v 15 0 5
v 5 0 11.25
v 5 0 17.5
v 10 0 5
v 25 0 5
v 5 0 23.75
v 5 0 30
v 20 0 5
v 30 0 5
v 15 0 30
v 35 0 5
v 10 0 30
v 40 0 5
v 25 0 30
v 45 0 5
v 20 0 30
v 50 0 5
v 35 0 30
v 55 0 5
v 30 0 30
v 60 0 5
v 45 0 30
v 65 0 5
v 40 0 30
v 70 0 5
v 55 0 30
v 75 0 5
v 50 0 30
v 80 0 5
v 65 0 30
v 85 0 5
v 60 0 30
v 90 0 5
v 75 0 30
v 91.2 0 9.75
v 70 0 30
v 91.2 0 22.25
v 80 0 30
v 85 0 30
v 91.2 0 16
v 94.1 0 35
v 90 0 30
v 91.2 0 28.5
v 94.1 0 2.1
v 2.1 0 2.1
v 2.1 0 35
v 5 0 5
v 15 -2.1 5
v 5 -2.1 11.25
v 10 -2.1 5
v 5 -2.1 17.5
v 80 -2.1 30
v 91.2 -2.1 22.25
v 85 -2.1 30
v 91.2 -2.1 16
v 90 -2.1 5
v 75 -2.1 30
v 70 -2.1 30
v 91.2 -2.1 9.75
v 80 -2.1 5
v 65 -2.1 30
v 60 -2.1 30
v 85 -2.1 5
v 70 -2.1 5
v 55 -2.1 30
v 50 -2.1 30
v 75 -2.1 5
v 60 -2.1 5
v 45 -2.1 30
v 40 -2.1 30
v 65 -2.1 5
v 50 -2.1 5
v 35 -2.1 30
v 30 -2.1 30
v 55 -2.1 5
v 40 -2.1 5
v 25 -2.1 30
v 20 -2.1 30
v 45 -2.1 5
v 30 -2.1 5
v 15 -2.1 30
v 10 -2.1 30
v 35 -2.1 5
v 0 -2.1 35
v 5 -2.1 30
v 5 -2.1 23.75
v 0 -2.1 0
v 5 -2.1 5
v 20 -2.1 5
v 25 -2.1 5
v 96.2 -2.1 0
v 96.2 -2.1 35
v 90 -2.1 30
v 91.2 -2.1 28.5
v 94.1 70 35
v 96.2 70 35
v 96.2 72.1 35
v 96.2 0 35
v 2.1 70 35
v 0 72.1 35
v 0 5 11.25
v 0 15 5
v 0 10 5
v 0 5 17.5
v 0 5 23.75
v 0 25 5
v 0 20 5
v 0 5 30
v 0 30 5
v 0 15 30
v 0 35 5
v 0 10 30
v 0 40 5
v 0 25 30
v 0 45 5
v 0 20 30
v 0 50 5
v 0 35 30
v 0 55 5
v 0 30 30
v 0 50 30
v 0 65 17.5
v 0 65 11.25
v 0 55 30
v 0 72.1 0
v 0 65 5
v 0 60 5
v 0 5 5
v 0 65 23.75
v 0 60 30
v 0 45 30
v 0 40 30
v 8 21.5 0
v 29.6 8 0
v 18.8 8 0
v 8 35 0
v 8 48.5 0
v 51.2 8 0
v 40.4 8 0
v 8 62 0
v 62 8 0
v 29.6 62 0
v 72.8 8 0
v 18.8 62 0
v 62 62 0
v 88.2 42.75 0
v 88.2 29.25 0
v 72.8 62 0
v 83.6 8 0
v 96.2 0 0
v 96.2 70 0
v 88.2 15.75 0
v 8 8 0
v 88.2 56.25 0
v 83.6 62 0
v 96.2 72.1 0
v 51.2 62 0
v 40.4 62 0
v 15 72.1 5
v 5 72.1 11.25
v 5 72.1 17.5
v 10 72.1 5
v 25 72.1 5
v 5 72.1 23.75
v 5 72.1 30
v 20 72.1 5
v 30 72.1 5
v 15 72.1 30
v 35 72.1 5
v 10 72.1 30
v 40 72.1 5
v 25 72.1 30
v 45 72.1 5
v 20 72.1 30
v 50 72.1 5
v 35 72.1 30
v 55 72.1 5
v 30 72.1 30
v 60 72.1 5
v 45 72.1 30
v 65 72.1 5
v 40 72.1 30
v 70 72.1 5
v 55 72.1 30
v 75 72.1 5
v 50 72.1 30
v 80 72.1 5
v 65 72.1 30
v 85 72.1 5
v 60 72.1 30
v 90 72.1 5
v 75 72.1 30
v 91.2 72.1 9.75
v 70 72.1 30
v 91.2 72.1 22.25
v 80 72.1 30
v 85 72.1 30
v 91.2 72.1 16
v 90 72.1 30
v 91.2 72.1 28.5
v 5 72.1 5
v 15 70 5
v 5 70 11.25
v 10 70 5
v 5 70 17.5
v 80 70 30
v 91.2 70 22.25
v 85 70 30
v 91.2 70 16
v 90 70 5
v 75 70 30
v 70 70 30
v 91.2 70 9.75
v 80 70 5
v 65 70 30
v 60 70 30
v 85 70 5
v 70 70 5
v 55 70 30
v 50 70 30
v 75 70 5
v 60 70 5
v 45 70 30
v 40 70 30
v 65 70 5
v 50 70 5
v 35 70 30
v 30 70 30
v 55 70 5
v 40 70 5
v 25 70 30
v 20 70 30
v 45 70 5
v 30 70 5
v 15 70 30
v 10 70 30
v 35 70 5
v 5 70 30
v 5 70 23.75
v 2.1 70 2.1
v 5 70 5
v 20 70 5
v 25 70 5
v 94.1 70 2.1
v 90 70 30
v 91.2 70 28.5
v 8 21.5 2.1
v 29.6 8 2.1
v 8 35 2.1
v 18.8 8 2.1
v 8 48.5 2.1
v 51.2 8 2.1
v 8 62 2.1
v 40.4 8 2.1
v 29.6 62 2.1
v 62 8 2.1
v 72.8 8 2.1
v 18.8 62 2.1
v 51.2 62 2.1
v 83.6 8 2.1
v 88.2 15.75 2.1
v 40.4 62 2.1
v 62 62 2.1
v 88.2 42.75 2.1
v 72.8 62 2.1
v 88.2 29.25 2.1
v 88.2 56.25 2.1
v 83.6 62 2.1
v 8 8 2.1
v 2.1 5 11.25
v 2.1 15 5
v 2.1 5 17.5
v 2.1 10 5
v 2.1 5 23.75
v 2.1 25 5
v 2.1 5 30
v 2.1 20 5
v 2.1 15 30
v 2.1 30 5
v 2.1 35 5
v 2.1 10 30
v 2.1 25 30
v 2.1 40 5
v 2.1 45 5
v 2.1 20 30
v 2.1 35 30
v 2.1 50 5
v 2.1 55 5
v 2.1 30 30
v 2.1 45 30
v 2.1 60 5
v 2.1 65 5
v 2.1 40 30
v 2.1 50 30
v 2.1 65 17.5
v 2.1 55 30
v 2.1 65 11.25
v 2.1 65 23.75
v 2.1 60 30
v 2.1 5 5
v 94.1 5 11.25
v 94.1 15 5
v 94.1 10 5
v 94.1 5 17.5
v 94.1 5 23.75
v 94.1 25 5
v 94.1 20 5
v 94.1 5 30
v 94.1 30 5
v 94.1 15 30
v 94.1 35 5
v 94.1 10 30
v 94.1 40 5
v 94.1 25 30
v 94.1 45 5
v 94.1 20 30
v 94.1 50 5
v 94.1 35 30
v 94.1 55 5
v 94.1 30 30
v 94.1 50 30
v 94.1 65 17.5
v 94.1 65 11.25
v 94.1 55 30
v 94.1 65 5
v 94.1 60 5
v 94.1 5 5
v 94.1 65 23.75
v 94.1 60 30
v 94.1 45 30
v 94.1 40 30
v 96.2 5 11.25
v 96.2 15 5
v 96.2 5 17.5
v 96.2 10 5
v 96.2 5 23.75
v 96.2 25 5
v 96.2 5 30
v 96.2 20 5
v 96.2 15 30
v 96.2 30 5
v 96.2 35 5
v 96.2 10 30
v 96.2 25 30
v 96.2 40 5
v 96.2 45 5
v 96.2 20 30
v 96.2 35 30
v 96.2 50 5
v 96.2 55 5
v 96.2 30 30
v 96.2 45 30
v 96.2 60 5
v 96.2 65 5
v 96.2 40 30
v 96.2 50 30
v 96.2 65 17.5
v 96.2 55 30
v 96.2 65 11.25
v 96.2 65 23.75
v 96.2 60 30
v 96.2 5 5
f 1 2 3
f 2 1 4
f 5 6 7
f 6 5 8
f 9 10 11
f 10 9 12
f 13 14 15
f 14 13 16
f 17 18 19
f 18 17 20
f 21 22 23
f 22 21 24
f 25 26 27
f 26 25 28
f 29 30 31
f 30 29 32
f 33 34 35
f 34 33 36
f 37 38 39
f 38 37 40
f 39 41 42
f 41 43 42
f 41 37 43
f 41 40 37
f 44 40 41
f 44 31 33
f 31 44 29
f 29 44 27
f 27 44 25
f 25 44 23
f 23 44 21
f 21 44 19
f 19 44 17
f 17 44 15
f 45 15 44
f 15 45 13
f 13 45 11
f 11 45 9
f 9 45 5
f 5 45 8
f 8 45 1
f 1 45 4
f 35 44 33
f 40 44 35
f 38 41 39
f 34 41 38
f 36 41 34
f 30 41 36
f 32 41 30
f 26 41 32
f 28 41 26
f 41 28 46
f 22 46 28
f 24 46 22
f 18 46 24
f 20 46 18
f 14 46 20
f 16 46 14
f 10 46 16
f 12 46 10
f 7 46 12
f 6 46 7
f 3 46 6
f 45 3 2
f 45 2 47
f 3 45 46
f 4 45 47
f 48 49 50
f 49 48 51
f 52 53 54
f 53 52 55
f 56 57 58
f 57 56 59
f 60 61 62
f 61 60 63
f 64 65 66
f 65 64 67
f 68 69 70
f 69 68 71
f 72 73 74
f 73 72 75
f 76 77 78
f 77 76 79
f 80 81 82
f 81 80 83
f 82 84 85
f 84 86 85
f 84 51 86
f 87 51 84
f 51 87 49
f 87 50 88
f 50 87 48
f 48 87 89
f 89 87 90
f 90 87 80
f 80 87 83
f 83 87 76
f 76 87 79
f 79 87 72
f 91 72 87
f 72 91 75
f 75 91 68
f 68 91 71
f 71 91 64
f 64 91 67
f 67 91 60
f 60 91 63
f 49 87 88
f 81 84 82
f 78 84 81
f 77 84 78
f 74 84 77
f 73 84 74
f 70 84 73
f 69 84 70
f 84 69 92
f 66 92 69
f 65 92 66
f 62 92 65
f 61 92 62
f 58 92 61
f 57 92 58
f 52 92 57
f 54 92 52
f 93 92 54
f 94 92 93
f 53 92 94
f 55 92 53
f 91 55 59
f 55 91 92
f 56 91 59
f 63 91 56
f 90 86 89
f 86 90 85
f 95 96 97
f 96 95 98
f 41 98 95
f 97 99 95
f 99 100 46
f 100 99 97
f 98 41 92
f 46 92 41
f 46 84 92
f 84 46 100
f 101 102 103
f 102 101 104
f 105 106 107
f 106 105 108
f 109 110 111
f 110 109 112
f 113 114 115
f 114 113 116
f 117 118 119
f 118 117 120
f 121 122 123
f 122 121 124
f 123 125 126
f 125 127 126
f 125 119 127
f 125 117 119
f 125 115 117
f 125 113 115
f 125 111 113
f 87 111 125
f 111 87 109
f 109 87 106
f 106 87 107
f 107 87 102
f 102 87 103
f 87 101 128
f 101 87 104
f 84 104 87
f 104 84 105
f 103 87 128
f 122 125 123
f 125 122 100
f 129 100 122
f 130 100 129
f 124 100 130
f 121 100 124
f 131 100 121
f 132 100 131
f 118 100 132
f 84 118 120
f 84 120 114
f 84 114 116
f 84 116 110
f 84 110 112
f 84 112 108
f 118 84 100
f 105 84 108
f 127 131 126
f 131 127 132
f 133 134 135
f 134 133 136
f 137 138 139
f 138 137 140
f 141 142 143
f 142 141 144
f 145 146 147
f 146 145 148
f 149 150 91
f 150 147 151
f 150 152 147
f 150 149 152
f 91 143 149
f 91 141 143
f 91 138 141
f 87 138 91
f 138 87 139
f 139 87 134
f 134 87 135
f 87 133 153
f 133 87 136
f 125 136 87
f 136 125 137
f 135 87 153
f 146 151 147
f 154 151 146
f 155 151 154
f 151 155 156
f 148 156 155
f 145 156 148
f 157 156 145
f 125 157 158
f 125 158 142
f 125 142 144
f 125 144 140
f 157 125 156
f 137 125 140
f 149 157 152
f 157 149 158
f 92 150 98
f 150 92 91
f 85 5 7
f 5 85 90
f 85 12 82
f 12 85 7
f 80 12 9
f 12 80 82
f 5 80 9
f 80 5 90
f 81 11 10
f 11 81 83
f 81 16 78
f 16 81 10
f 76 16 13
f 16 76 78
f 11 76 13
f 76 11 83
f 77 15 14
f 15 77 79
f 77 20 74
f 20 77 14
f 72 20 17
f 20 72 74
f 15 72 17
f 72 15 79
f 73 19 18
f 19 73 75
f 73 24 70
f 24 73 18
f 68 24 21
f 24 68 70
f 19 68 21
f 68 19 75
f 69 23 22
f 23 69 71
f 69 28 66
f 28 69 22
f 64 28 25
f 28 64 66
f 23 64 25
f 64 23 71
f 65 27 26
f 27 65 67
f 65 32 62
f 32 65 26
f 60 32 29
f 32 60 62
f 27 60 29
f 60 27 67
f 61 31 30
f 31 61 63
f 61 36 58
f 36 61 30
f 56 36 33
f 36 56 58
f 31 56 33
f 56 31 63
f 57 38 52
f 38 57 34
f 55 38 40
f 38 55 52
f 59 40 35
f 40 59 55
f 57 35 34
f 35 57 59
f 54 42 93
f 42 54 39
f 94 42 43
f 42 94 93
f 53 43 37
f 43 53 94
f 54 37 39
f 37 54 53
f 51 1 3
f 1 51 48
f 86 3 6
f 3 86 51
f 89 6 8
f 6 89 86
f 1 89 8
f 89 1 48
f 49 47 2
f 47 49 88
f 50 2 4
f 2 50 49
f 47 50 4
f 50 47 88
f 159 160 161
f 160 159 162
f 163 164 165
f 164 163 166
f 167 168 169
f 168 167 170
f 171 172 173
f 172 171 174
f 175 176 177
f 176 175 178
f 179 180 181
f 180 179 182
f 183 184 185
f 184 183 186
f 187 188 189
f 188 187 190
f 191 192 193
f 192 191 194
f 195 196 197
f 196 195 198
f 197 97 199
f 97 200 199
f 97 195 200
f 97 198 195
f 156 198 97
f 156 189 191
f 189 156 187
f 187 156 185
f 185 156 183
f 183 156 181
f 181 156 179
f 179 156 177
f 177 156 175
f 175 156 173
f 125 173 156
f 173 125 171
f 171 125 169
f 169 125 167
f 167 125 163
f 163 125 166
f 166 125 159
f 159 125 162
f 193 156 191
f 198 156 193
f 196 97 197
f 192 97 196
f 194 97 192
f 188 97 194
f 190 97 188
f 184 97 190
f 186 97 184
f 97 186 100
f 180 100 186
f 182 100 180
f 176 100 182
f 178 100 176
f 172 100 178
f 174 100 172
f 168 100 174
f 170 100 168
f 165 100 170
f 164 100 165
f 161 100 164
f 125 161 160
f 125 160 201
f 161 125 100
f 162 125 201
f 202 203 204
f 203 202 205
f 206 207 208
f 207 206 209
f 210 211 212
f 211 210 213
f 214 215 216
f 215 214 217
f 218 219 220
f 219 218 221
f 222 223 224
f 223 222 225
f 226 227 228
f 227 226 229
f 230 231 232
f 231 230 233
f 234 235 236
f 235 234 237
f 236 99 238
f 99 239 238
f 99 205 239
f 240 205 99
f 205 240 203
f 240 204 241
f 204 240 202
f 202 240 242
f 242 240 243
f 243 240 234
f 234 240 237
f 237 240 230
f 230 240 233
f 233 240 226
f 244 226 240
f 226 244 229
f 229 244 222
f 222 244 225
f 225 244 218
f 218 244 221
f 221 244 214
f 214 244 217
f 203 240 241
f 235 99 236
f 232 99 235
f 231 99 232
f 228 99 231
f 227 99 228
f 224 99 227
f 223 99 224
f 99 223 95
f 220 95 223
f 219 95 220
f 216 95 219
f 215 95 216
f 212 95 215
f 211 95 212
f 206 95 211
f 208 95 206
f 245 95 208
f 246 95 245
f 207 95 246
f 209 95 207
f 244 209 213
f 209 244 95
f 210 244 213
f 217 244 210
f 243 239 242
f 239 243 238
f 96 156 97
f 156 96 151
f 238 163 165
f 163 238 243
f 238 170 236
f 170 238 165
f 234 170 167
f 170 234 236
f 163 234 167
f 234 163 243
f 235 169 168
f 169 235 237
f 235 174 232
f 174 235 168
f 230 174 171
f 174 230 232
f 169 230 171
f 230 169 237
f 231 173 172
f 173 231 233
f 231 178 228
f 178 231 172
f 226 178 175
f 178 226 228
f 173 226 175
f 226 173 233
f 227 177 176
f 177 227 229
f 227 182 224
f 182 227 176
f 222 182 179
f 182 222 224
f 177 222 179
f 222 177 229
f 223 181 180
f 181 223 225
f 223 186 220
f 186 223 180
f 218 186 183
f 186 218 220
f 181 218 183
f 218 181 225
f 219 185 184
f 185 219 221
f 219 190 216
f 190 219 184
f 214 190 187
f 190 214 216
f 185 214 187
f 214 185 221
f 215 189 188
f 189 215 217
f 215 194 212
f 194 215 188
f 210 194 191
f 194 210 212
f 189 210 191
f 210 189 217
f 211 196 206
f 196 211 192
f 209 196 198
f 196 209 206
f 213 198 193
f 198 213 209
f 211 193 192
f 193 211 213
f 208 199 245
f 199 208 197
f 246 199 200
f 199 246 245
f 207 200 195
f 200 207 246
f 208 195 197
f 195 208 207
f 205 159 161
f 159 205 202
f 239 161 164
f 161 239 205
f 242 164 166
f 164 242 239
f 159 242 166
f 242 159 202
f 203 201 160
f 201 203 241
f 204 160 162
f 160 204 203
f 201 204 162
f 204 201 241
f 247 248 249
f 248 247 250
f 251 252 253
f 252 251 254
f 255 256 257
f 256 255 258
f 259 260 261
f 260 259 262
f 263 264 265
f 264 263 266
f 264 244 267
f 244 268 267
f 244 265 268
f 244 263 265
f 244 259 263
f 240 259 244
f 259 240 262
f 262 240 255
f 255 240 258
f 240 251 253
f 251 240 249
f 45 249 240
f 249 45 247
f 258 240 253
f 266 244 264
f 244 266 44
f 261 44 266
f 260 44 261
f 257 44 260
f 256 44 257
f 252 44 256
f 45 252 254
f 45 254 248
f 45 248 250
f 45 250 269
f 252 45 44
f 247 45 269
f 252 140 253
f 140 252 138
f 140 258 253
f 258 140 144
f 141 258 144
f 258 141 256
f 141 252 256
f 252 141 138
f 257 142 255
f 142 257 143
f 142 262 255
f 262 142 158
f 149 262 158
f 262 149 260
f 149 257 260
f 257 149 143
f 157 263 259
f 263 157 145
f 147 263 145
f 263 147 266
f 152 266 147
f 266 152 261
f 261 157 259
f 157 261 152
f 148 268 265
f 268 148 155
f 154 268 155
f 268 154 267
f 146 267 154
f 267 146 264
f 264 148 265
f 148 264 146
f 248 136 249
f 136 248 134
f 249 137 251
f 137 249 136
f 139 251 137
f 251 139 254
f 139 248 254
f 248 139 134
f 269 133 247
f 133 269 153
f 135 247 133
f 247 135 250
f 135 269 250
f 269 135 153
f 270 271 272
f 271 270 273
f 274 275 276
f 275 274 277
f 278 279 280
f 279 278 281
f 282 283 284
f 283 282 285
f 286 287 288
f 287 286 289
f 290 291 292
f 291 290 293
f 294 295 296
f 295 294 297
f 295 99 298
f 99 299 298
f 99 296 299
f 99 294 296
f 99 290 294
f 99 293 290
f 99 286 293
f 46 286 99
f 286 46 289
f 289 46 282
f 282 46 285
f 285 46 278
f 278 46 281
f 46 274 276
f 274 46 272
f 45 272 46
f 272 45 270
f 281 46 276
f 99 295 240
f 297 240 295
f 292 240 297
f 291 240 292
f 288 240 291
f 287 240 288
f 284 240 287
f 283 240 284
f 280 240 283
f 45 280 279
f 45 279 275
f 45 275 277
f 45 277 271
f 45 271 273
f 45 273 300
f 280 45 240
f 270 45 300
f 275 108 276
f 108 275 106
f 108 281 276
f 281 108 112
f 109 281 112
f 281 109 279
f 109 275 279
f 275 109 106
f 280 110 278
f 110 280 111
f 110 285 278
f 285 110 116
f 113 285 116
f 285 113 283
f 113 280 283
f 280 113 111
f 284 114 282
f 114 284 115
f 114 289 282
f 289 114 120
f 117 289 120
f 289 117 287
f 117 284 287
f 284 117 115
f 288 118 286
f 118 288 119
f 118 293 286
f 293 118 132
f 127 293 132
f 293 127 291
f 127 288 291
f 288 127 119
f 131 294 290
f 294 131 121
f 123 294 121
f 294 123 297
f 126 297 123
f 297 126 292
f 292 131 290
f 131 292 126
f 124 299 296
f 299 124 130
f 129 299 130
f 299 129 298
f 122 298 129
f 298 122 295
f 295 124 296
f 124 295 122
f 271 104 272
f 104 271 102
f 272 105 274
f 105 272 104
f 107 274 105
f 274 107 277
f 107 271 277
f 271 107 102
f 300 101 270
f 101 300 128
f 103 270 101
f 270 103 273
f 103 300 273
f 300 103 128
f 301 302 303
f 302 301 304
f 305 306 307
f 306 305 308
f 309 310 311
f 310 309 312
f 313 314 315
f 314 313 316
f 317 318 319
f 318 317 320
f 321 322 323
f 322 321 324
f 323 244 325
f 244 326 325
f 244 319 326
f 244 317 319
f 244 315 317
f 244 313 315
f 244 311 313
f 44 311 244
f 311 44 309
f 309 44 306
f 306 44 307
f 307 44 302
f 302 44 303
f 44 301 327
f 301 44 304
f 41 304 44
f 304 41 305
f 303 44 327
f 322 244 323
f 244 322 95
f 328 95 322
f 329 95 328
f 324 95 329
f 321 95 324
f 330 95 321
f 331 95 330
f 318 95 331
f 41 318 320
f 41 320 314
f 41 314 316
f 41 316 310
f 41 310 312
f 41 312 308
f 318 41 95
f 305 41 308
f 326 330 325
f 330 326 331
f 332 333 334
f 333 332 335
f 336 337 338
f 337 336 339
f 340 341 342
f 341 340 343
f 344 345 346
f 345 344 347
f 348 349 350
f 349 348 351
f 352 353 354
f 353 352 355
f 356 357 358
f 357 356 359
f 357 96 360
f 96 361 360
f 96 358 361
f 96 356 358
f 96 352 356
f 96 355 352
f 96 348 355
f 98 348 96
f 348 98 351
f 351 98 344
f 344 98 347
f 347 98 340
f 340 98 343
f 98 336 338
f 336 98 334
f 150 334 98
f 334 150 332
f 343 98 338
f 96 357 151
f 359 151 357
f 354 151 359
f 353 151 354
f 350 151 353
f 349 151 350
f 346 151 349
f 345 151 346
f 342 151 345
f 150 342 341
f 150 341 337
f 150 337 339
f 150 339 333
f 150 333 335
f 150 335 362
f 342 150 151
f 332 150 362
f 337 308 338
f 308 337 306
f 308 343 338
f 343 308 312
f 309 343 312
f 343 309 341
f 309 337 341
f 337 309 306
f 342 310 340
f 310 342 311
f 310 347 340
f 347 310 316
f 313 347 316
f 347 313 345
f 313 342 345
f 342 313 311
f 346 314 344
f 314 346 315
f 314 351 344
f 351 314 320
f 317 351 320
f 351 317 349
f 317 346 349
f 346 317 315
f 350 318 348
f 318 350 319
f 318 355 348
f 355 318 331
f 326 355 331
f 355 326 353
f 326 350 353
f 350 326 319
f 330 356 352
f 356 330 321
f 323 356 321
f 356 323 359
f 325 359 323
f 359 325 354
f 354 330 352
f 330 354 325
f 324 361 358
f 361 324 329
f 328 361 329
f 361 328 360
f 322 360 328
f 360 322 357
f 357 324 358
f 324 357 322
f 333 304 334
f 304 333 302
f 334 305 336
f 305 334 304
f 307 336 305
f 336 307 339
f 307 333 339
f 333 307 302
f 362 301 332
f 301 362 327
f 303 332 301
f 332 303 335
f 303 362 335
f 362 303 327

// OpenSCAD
$fn=40;


length_id=92;
width = 70;
height=35;
thickness=2.1;

length = length_id+thickness*2;

rotate([90,0,0])
	boxwall(0,0,length,height,5);


translate([0,width+thickness,0])
	rotate([90,0,0])
		boxwall(0,0,length,height,5);

boxwall(0,0,length,width,8);

rotate([90,0,90])
boxwall(0,0,width,height,5);

translate([length-thickness,0,0])
rotate([90,0,90])
boxwall(0,0,width,height,5);

module boxwall (x,y,x1,y1,edge=5)
{

	linear_extrude (height=thickness)
		difference () {
			polygon( points=[[x,y],[x1,y],[x1,y1],[x,y1]]);
			hazard_cutout_2d(x+edge,y+edge,x1-edge,y1-edge);
		}
}




	module hazard_cutout_2d (x,y,x1,y1)
{


	intersection () {

		polygon( points=[[x,y],[x1,y],[x1,y1],[x,y1]]);

			union() {

				stripe_width=(y1-y)/5;
				for(i=[-4:((x1-x)/stripe_width)+4]) {
					if(i % 2) {

					//	echo(i);
							polygon(points = [[x+(i+3)*stripe_width,y],[x+(i+4)*stripe_width,y],
								[x+i*stripe_width,y1],[x+(i-1)*stripe_width,y1]]);


				//		echo (x+(i-1)*stripe_width,y,x+i*stripe_width,y1);
					}
				}
			}
		}
}
